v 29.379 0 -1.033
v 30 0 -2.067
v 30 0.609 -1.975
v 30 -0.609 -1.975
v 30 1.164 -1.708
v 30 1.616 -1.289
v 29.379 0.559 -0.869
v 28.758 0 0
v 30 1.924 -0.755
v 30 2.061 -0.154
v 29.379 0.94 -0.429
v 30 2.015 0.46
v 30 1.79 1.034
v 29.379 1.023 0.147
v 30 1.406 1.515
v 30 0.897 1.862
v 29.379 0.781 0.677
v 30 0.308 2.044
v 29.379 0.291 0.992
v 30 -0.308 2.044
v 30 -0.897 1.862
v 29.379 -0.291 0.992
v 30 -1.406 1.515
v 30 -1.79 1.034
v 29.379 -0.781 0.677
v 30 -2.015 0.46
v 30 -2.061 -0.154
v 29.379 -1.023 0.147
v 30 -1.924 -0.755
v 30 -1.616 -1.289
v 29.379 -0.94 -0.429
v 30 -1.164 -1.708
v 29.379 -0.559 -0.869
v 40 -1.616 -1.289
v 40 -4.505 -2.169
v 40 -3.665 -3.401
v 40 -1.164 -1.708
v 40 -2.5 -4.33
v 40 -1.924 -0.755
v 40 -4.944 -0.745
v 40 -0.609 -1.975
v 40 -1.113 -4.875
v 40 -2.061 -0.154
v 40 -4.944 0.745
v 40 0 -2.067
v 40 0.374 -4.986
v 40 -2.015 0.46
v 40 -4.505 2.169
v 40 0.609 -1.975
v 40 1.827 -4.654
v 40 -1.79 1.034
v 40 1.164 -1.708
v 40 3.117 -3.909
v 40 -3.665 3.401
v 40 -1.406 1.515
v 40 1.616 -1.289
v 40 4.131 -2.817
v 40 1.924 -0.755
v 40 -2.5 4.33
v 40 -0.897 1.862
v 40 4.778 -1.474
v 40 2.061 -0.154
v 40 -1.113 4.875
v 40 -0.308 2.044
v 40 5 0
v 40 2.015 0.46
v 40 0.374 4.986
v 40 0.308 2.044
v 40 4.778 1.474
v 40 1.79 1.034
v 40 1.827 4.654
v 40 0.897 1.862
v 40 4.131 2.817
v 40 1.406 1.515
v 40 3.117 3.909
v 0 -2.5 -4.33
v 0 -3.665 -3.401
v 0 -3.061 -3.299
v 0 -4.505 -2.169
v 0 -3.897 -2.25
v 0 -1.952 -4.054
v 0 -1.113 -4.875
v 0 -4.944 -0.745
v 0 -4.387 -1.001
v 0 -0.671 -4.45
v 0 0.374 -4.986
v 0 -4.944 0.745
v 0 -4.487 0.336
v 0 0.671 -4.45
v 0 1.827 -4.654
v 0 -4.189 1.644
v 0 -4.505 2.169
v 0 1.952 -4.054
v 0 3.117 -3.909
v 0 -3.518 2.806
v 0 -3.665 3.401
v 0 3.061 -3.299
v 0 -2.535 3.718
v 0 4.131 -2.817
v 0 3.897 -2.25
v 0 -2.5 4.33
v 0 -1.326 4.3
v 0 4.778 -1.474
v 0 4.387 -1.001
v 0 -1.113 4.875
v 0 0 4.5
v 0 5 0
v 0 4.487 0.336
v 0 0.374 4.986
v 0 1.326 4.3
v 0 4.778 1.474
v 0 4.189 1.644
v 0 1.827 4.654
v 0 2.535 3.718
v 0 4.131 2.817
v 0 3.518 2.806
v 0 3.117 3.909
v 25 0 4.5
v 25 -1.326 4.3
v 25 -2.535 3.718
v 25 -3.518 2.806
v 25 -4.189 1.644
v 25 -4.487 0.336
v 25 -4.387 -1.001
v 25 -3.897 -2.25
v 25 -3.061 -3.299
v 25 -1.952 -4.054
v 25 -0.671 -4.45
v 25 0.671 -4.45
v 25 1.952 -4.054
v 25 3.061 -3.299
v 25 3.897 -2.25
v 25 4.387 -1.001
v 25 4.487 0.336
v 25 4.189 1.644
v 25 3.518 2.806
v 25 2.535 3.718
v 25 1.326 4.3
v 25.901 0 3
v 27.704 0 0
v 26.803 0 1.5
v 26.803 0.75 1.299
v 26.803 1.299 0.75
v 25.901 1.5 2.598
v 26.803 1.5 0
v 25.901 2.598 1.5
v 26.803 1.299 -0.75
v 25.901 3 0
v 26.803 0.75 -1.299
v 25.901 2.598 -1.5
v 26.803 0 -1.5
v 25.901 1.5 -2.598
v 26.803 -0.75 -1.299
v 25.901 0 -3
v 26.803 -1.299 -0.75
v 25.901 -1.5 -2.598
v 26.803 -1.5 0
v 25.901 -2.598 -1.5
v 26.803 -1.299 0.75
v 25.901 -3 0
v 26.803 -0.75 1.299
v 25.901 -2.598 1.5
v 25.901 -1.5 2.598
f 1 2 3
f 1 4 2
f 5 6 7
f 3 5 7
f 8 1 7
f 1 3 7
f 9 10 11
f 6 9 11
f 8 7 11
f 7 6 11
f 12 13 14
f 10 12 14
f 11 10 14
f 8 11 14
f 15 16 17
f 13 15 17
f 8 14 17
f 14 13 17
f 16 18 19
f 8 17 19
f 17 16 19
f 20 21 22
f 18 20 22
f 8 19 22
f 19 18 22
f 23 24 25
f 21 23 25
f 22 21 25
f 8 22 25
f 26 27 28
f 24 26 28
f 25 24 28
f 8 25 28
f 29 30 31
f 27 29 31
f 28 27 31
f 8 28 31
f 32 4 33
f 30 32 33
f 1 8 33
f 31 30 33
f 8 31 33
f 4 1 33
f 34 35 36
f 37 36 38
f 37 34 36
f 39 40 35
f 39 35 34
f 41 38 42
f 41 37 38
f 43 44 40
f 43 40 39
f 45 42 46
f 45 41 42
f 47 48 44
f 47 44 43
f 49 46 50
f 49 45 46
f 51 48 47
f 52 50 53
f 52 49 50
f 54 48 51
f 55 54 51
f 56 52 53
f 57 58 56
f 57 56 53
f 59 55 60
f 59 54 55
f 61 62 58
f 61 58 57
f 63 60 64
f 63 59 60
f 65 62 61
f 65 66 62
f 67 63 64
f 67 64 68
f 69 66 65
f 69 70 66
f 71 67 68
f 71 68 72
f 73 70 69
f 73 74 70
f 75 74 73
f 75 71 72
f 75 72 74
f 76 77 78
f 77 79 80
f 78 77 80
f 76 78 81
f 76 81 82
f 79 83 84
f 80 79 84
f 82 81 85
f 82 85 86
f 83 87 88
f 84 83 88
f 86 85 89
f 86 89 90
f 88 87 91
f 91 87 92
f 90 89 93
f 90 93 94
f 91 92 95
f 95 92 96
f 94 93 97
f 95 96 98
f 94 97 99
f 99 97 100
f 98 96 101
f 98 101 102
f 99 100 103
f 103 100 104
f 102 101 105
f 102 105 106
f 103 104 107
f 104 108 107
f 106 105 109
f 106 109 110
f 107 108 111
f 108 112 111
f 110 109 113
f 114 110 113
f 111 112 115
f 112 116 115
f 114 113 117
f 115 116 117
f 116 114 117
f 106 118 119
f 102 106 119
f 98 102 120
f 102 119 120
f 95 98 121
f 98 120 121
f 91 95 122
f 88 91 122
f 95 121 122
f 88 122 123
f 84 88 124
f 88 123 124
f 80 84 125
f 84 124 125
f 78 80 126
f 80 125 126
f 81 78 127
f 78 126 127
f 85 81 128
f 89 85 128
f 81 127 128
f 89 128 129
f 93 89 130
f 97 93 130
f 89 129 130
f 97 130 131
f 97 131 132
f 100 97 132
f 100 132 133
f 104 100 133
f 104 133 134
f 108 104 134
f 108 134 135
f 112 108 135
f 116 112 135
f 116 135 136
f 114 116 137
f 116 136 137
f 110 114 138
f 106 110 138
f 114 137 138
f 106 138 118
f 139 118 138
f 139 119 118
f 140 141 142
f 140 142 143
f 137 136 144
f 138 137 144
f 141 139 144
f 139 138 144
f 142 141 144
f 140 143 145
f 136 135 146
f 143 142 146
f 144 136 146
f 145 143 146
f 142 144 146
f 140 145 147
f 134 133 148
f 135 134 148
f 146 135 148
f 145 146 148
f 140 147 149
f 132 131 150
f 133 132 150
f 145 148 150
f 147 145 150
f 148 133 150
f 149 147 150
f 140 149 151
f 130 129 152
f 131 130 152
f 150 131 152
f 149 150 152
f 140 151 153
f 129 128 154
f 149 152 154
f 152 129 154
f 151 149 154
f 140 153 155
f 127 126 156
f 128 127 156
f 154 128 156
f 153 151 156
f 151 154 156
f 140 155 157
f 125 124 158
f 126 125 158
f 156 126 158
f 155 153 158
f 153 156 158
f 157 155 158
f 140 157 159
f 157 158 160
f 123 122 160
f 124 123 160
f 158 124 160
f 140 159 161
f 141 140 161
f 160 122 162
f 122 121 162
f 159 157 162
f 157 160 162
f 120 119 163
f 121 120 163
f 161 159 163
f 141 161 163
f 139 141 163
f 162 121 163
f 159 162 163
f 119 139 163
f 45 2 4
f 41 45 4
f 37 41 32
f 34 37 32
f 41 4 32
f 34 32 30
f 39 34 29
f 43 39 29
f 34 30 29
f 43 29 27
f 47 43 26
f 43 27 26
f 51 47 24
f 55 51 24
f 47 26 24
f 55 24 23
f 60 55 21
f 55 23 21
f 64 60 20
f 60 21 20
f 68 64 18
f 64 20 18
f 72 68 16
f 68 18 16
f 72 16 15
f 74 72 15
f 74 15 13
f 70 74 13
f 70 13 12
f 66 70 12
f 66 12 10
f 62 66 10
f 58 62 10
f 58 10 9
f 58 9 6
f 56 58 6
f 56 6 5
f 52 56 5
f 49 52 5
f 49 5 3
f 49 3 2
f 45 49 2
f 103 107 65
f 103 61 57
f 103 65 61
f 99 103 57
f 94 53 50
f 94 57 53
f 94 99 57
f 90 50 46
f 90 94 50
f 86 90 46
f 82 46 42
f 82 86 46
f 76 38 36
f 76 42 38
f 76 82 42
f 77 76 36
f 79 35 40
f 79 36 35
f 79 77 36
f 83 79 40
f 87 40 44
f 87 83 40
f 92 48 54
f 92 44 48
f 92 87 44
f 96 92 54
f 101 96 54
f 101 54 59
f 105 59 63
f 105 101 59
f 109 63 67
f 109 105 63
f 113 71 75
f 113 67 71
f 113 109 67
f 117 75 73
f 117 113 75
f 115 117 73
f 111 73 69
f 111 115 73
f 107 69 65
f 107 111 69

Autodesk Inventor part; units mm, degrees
ref_plane "YZ Plane" through (0, 0, 0) normal (1, 0, 0) x (0, 1, 0)
ref_plane "XZ Plane" through (0, 0, 0) normal (0, 1, 0) x (-1, 0, 0)
ref_plane "XY Plane" through (0, 0, 0) normal (0, 0, 1) x (1, 0, 0)
sketch "Sketch1" plane through (0, 0, 0) normal (1, 0, 0) x (0, 1, 0)
  circle A0 centre (0, 0) radius 5
  dimension "d0" = 10
extrude "Extrusion1" add sketch "Sketch1" along normal blind 40
sketch "Sketch2" plane through (40, 0, 0) normal (1, 0, 0) x (0, 0, -1)
  point P0 (0, 0)
  point P1 (0, 0)
hole "Hole1" at (40, 0, 0) direction (-1, 0, 0) diameter 4.134 depth 10 tip angle 118 thread size "M5x0.8" class "6H" standard "ANSI Metric M Profile"
sketch "Sketch3" plane through (0, 0, 0) normal (-1, 0, 0) x (0, 0, 1)
  point P0 (0, 0)
  point P1 (0, 0)
hole "Hole2" at (0, 0, 0) direction (1, 0, 0) diameter 9 depth 25 tip angle 118 clearance for "Flat Head Machine Screw" size "M8" standard "Ansi Metric M Profile"
properties part number "CopleCatheter"
